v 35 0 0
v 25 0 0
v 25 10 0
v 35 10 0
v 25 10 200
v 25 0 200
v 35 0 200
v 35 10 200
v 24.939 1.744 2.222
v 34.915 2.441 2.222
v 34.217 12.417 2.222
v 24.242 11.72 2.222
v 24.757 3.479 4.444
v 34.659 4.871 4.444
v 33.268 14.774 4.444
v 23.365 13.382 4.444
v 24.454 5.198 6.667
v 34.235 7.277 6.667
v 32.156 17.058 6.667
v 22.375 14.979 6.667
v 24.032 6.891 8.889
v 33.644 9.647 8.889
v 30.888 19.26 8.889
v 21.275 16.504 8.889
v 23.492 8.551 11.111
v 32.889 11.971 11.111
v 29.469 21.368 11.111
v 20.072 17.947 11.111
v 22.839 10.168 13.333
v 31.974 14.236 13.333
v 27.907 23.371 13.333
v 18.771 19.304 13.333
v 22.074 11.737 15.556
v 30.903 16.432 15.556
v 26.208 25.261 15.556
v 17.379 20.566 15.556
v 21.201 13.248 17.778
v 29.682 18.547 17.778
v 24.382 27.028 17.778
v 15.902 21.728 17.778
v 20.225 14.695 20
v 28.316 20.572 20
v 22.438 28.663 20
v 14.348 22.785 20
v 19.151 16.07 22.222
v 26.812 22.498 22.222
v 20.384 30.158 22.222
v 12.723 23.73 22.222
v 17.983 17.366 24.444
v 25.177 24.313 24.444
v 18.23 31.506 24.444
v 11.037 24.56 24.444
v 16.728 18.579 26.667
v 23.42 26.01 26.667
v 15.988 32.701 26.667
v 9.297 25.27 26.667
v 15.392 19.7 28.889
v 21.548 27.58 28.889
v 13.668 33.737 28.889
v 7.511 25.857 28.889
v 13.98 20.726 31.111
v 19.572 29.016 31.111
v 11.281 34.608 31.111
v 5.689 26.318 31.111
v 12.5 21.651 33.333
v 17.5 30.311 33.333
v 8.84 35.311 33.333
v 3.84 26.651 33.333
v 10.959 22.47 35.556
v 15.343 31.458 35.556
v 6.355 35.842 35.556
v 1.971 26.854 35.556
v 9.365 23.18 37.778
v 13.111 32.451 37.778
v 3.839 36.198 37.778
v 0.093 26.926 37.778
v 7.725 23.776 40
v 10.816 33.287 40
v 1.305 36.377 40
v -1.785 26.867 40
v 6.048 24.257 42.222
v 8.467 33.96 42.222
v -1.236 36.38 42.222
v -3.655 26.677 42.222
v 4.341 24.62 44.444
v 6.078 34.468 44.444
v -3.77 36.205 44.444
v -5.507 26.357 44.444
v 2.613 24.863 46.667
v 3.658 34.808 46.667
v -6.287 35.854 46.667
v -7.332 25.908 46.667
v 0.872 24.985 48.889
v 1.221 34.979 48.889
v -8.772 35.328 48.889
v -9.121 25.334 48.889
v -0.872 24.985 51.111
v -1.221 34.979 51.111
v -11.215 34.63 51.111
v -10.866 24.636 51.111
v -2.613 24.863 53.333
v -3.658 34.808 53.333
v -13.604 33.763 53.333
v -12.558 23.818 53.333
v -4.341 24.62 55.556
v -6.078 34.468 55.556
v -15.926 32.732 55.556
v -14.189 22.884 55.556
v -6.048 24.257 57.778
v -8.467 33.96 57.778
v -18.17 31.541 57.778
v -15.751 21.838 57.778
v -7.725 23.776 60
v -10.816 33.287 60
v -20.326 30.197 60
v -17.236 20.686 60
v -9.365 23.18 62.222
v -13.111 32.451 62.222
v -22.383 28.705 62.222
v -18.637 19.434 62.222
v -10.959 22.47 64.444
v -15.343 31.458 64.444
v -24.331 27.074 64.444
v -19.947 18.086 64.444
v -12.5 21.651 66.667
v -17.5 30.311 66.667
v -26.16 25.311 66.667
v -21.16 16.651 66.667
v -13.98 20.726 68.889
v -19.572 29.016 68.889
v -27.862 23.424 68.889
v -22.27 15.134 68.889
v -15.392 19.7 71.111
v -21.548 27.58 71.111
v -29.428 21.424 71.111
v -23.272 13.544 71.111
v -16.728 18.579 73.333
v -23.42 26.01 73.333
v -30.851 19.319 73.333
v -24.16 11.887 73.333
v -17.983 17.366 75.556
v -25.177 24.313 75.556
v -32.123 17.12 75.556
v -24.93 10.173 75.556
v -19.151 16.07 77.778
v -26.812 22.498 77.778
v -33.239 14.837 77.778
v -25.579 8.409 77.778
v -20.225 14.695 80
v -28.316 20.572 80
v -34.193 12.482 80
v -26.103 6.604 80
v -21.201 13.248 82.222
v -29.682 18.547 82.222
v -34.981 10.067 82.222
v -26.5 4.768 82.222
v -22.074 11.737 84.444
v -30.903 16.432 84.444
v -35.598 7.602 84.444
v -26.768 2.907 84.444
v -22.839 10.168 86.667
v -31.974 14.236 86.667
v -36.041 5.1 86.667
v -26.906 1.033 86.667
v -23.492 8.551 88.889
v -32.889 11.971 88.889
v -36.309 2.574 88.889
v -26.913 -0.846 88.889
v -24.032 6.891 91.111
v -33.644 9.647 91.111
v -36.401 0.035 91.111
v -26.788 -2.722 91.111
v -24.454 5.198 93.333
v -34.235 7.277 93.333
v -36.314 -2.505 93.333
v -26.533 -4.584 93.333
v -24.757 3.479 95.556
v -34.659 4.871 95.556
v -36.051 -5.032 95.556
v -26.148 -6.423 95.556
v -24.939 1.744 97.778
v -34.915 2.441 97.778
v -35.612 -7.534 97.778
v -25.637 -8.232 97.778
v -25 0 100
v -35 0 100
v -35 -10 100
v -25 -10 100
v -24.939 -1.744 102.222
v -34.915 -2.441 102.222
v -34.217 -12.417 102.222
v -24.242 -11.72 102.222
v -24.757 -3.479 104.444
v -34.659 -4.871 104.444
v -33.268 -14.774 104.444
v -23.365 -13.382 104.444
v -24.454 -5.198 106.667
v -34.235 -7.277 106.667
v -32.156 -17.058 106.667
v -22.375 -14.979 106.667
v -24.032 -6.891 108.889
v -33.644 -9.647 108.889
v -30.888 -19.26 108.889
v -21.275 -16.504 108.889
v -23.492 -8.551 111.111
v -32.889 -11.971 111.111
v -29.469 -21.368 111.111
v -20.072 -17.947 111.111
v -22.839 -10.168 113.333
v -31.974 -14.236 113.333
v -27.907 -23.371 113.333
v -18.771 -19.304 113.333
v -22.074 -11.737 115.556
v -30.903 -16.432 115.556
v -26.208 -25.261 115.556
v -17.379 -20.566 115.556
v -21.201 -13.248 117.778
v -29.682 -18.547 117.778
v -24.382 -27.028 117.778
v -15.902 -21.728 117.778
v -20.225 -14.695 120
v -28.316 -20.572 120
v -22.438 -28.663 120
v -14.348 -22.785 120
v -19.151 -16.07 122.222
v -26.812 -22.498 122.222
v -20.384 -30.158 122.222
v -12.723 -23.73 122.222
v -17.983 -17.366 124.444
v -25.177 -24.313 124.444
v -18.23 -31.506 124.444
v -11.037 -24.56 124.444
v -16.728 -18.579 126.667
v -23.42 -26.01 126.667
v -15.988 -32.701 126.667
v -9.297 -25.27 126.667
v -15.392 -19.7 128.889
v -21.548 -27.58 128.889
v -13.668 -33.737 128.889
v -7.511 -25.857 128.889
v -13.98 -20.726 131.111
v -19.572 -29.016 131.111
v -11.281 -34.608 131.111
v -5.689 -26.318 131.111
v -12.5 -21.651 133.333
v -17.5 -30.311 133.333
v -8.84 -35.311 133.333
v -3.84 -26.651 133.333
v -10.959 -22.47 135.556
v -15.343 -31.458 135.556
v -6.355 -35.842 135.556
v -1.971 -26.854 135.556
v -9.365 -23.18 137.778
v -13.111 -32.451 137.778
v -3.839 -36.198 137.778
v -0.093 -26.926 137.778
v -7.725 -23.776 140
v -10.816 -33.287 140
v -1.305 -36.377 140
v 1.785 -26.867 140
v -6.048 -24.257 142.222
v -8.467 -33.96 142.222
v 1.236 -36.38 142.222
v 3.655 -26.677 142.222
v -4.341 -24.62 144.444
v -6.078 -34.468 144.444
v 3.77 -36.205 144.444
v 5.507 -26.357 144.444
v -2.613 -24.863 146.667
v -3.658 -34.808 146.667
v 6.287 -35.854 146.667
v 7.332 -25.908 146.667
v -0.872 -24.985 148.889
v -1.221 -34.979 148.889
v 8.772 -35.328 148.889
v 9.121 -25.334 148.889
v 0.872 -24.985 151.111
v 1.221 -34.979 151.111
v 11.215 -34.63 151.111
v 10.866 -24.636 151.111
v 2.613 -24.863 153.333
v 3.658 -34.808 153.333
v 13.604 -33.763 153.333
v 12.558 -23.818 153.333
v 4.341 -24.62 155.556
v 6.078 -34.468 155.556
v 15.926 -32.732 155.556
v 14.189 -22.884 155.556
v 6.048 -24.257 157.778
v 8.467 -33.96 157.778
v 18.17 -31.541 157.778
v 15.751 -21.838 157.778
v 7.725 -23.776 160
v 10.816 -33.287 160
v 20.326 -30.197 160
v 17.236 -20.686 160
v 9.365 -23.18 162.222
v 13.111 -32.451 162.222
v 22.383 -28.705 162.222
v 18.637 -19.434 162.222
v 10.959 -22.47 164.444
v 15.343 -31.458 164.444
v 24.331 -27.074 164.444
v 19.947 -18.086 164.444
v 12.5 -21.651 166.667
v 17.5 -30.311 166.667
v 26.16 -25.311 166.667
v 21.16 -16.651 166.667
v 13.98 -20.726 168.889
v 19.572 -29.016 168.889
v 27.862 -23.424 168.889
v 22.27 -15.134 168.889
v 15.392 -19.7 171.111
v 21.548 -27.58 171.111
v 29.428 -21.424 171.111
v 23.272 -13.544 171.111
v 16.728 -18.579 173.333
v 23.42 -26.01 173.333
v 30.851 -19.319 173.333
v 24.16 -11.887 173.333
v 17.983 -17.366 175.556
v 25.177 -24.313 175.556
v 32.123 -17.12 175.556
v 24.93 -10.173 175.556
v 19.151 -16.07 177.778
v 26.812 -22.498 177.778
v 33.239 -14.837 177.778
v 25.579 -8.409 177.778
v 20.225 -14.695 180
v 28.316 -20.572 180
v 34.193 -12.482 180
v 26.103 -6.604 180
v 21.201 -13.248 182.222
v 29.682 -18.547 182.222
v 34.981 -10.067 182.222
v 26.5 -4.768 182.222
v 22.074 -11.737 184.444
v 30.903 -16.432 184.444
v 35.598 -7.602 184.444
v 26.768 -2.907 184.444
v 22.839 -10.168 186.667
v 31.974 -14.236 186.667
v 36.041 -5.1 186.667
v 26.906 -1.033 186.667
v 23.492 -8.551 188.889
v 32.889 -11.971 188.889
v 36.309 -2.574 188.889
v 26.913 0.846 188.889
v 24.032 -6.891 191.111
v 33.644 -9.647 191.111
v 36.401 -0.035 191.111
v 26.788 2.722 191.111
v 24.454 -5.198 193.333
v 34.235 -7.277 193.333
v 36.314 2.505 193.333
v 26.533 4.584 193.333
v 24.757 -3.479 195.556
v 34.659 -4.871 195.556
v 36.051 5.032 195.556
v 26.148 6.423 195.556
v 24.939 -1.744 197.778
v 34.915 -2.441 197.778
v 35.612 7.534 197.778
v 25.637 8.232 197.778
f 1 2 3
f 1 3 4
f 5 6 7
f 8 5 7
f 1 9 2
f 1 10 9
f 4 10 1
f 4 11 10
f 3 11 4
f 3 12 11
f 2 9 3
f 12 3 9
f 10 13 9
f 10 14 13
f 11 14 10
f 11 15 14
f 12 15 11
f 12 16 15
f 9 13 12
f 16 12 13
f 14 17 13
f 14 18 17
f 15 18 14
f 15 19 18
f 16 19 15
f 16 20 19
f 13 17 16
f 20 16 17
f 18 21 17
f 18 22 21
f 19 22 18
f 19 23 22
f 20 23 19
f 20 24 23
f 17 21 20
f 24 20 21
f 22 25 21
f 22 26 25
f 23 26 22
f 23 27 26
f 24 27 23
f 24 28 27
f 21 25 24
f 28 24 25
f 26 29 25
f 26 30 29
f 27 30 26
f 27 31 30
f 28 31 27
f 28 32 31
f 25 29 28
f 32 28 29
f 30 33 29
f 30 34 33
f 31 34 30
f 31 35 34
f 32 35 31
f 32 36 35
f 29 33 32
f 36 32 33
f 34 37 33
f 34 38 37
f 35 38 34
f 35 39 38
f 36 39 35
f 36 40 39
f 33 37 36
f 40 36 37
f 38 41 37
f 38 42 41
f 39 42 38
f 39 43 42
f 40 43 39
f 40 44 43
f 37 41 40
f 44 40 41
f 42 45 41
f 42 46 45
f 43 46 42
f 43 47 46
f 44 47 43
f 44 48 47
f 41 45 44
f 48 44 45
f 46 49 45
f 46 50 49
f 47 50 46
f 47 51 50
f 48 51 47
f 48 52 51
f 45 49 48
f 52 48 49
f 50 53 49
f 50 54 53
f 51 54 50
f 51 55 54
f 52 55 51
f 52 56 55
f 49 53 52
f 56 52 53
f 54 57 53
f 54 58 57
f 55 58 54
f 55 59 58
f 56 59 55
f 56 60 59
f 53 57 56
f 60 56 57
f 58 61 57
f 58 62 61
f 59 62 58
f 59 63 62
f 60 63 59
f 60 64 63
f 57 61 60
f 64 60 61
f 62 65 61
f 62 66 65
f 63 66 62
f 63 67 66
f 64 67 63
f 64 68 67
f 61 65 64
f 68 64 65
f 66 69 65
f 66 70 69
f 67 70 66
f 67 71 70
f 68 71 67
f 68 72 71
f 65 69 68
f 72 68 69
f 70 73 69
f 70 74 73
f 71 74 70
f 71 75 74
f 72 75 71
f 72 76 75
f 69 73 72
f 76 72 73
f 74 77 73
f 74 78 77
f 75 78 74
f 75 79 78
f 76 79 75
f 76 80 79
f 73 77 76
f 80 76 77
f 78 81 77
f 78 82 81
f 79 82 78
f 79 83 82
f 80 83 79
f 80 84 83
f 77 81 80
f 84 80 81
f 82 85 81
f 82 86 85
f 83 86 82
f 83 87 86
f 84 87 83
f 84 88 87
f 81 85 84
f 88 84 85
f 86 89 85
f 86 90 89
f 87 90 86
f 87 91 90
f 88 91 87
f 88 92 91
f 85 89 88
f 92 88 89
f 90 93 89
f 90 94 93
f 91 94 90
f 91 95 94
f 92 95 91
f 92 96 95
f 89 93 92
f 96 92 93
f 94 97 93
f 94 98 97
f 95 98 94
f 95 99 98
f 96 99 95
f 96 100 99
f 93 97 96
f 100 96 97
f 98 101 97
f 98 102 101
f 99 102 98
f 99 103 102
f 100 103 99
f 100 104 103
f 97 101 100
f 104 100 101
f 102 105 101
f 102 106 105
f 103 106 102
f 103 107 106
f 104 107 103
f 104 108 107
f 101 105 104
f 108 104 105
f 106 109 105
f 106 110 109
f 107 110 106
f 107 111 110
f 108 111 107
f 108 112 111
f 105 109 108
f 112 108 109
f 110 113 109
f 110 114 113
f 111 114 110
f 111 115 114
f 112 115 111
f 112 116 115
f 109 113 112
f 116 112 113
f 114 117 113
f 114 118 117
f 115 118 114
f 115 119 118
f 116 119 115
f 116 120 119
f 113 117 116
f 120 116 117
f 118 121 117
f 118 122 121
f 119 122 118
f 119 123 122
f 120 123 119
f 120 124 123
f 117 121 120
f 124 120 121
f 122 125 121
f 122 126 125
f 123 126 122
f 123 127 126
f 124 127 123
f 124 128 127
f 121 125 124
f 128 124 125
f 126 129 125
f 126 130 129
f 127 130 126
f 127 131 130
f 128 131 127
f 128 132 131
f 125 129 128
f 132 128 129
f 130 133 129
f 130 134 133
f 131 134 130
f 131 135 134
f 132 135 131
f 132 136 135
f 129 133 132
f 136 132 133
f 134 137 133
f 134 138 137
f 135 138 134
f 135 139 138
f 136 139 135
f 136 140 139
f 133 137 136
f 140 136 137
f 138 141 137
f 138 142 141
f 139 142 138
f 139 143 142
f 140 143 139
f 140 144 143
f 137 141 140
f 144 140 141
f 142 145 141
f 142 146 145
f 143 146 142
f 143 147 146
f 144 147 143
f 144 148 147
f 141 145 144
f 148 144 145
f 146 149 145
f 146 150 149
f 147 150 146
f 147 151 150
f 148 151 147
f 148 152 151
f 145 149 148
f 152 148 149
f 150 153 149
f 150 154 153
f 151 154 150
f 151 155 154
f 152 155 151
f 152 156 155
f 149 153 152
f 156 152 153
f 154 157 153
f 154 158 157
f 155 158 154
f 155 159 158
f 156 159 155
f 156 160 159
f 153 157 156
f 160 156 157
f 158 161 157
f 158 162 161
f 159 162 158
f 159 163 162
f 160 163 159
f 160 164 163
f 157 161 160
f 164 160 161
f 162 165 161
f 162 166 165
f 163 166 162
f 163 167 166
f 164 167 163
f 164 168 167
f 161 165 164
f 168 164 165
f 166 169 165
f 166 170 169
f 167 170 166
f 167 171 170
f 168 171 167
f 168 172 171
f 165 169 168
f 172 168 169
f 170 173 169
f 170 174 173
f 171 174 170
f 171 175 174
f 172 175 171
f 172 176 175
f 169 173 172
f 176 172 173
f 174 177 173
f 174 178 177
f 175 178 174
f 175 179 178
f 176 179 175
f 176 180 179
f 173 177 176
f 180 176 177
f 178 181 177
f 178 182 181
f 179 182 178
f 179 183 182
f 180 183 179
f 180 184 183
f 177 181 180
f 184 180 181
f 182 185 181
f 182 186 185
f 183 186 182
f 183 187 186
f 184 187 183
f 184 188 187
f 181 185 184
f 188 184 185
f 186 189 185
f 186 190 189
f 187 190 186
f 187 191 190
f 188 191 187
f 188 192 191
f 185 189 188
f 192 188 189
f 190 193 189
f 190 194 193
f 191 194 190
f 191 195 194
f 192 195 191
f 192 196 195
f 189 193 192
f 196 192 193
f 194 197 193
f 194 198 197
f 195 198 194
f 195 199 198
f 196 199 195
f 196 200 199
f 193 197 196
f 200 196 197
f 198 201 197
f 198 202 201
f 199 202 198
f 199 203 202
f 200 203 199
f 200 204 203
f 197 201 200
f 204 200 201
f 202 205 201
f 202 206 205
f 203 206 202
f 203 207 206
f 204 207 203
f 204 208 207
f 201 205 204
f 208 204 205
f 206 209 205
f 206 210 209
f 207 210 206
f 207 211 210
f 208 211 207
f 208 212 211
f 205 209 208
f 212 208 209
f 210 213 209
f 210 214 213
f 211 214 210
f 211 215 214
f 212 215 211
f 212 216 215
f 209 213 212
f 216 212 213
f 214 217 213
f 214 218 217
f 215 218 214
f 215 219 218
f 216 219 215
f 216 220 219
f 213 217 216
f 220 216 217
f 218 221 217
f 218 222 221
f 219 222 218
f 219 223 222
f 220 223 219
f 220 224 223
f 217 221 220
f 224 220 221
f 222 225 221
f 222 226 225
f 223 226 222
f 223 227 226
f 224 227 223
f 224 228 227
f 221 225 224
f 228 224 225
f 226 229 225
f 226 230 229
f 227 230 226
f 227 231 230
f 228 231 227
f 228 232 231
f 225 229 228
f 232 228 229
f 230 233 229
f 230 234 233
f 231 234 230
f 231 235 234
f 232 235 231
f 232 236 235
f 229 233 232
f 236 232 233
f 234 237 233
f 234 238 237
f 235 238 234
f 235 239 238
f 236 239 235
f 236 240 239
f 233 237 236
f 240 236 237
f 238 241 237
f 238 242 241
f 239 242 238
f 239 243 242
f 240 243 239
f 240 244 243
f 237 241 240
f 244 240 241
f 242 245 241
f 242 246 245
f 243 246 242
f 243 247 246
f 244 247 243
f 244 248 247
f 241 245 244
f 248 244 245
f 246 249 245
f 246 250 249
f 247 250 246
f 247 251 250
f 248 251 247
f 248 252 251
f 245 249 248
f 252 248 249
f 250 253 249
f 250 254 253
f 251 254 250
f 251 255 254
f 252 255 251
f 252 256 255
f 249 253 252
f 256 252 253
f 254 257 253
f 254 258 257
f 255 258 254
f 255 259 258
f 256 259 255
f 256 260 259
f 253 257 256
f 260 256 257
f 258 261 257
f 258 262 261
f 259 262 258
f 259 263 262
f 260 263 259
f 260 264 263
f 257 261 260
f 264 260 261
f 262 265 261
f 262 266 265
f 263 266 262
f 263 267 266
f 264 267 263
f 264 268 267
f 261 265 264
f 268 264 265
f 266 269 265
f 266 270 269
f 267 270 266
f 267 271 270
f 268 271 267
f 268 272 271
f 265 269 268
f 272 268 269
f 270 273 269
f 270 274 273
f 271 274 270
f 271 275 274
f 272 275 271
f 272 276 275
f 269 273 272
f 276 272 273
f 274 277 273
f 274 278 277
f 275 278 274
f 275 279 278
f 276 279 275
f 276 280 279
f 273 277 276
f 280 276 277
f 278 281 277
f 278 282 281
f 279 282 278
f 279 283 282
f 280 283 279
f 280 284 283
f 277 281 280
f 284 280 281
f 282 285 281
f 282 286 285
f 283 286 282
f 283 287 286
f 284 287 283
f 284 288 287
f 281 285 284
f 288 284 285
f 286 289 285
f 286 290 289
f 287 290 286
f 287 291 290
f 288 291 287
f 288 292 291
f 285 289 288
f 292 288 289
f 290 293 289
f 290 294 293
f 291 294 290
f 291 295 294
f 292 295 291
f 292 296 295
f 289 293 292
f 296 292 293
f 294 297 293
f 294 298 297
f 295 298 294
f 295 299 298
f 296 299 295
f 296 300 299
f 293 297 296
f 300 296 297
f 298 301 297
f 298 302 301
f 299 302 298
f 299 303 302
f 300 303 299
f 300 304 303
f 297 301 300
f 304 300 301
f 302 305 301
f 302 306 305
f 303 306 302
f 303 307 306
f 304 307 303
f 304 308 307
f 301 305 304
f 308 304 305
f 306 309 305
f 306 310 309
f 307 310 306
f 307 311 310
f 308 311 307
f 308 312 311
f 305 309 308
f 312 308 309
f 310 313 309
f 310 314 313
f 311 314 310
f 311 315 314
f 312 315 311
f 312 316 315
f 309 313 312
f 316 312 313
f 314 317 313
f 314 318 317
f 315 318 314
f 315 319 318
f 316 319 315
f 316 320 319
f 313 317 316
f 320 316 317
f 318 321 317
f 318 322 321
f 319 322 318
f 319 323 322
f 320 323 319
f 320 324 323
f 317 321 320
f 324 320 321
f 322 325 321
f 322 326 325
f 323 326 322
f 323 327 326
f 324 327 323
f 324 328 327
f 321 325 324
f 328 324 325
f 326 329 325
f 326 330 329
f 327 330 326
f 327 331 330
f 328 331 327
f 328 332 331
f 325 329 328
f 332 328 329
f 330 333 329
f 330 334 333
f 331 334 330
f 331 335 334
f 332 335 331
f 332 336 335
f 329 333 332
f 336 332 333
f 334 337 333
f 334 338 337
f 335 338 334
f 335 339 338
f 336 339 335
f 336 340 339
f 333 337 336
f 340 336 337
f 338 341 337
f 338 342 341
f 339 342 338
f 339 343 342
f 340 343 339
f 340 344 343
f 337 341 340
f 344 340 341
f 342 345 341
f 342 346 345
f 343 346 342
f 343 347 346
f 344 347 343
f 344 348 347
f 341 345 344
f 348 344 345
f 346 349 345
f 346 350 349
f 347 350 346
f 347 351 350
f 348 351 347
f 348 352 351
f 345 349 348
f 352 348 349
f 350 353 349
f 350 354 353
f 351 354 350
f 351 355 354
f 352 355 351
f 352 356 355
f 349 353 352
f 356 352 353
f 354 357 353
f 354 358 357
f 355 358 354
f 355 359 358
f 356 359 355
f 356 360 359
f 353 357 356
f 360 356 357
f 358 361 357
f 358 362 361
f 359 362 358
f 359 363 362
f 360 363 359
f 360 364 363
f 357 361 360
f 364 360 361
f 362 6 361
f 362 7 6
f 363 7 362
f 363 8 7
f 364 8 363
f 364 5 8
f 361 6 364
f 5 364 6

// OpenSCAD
$fn=90;
/*
translate([0,0,0]) cylinder(d=50, h=10);
translate([0,0,40]) cylinder(d=50, h=10);
difference() {
translate([0,0,10]) cylinder(d=50, h=30);
translate([0,0,25]) rotate_extrude()
    translate([25,0,0]) circle(d=40);
}
rotate_extrude()
    polygon(
        points=[
        [0,0],
        [0,100],
        [50,100],
        [30,75],
        [30,25],
        [50,0]
        ]
        );
//*/

linear_extrude(height=200, twist=-360)
    translate([25,0,0]) square([10,10]);
